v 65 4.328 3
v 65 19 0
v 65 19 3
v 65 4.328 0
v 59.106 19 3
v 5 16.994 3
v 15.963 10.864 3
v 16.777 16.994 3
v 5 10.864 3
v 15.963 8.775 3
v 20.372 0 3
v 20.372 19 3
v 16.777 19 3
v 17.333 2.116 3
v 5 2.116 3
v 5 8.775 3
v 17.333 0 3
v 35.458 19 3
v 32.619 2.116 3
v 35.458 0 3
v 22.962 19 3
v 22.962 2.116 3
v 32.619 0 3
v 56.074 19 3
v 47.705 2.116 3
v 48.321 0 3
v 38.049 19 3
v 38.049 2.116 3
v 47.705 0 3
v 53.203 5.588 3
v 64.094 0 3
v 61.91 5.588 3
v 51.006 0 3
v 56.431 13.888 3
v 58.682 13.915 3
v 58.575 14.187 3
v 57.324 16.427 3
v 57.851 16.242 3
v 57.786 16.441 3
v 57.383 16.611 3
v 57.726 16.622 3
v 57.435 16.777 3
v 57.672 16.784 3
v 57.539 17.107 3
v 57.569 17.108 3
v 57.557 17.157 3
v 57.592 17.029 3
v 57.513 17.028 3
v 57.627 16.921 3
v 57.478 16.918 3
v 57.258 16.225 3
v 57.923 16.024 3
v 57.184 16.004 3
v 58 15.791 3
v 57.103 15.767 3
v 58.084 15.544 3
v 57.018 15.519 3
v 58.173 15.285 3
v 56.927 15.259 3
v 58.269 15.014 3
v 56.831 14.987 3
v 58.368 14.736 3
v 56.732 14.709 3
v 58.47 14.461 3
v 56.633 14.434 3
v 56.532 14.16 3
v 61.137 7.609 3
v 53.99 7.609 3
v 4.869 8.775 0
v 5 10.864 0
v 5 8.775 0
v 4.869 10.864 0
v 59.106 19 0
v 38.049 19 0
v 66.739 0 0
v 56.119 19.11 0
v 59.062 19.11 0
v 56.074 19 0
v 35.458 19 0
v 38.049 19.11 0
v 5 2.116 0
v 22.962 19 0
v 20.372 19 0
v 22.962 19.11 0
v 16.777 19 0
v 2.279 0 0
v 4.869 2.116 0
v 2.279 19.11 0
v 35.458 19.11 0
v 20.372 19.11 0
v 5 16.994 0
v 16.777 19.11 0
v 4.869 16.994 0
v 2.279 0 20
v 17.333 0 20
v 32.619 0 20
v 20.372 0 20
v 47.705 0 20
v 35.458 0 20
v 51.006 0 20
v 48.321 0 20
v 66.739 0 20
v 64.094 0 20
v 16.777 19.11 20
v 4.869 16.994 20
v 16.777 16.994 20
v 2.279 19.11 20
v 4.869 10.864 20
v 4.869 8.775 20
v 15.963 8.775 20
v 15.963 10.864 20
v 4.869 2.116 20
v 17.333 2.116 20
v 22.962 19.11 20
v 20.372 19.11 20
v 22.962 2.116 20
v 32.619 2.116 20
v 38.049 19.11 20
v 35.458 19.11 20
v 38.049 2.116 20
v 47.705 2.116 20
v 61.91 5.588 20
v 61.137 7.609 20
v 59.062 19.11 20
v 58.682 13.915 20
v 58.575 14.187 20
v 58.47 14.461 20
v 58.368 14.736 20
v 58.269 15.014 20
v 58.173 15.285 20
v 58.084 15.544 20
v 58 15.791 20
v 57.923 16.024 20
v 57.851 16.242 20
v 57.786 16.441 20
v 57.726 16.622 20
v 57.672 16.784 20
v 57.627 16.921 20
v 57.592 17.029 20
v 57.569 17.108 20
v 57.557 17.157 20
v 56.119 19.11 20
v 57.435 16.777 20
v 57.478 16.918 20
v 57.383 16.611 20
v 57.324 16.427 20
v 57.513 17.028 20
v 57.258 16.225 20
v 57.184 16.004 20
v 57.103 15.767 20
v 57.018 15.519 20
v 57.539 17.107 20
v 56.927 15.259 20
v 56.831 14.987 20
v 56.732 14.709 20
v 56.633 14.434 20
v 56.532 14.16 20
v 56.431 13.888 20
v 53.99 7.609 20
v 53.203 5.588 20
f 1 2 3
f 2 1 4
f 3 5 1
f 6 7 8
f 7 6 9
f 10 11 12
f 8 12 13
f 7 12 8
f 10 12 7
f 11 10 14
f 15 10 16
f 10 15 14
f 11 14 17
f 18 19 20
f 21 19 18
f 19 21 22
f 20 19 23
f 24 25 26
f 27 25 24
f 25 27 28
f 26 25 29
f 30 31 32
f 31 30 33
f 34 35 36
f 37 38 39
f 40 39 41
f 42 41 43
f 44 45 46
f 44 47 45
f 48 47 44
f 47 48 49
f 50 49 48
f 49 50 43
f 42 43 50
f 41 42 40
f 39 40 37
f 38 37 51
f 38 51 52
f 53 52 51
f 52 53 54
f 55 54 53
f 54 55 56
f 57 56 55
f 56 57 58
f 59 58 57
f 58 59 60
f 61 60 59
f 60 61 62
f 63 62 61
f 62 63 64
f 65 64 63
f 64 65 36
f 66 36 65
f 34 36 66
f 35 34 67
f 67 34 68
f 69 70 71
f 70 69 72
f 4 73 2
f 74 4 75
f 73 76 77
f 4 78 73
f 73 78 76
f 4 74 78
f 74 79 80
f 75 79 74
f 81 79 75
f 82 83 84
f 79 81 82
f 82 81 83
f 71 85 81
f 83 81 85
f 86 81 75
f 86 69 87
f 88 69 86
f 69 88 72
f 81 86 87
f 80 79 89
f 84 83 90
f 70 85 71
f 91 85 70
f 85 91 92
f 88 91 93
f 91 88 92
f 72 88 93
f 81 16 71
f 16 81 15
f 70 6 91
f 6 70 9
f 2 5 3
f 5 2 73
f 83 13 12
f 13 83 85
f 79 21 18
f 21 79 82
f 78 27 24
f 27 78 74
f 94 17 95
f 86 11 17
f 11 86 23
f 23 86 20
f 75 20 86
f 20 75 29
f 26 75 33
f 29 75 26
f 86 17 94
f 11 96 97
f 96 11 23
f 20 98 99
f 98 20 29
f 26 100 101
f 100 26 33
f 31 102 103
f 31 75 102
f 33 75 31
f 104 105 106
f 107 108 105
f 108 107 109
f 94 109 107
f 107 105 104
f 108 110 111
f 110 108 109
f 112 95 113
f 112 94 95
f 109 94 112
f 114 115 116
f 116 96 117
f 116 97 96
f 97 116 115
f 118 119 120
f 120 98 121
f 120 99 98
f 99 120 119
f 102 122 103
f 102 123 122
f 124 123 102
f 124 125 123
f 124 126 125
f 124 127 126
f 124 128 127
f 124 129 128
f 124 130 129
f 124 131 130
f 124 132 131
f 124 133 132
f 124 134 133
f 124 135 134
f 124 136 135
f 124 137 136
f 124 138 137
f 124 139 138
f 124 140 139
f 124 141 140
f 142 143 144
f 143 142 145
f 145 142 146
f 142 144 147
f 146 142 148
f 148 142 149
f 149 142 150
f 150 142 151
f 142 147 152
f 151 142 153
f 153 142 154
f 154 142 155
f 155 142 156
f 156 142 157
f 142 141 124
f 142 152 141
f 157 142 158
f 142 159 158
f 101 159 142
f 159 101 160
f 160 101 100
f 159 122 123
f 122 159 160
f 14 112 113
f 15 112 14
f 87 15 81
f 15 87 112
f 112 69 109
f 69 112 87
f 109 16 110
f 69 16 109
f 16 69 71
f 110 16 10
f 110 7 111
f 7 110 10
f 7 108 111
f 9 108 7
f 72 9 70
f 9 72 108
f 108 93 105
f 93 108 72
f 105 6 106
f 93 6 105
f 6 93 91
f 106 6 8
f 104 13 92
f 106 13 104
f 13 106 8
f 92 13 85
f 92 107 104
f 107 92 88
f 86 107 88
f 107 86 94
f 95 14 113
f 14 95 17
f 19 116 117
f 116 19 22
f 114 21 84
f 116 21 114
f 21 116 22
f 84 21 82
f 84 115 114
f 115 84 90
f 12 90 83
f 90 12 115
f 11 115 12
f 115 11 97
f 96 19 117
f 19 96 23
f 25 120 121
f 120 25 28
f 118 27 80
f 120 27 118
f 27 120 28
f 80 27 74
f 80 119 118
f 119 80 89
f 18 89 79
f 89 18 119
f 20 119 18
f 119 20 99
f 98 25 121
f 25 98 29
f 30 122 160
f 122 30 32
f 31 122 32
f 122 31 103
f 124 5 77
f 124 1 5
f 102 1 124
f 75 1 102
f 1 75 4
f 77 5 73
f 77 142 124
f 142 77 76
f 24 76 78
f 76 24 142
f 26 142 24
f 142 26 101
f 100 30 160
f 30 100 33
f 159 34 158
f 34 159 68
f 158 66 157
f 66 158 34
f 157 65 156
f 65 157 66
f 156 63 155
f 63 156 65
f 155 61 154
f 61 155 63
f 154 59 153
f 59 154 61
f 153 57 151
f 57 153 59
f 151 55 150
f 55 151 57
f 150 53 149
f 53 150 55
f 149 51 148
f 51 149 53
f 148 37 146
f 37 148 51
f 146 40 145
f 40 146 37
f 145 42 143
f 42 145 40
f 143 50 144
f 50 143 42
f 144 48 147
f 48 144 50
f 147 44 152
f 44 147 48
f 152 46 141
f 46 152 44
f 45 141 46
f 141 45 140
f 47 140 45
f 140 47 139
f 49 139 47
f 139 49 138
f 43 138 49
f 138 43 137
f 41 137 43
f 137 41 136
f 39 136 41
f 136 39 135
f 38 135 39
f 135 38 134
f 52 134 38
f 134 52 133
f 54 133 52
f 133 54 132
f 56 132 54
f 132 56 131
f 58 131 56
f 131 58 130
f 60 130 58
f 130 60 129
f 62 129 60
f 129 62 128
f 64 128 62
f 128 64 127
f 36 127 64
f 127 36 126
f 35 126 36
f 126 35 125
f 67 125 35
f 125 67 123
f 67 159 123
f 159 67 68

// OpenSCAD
translate([5,0,0])cube([60,19, 3]);
linear_extrude(20)text(text="ELLA", size=20);
